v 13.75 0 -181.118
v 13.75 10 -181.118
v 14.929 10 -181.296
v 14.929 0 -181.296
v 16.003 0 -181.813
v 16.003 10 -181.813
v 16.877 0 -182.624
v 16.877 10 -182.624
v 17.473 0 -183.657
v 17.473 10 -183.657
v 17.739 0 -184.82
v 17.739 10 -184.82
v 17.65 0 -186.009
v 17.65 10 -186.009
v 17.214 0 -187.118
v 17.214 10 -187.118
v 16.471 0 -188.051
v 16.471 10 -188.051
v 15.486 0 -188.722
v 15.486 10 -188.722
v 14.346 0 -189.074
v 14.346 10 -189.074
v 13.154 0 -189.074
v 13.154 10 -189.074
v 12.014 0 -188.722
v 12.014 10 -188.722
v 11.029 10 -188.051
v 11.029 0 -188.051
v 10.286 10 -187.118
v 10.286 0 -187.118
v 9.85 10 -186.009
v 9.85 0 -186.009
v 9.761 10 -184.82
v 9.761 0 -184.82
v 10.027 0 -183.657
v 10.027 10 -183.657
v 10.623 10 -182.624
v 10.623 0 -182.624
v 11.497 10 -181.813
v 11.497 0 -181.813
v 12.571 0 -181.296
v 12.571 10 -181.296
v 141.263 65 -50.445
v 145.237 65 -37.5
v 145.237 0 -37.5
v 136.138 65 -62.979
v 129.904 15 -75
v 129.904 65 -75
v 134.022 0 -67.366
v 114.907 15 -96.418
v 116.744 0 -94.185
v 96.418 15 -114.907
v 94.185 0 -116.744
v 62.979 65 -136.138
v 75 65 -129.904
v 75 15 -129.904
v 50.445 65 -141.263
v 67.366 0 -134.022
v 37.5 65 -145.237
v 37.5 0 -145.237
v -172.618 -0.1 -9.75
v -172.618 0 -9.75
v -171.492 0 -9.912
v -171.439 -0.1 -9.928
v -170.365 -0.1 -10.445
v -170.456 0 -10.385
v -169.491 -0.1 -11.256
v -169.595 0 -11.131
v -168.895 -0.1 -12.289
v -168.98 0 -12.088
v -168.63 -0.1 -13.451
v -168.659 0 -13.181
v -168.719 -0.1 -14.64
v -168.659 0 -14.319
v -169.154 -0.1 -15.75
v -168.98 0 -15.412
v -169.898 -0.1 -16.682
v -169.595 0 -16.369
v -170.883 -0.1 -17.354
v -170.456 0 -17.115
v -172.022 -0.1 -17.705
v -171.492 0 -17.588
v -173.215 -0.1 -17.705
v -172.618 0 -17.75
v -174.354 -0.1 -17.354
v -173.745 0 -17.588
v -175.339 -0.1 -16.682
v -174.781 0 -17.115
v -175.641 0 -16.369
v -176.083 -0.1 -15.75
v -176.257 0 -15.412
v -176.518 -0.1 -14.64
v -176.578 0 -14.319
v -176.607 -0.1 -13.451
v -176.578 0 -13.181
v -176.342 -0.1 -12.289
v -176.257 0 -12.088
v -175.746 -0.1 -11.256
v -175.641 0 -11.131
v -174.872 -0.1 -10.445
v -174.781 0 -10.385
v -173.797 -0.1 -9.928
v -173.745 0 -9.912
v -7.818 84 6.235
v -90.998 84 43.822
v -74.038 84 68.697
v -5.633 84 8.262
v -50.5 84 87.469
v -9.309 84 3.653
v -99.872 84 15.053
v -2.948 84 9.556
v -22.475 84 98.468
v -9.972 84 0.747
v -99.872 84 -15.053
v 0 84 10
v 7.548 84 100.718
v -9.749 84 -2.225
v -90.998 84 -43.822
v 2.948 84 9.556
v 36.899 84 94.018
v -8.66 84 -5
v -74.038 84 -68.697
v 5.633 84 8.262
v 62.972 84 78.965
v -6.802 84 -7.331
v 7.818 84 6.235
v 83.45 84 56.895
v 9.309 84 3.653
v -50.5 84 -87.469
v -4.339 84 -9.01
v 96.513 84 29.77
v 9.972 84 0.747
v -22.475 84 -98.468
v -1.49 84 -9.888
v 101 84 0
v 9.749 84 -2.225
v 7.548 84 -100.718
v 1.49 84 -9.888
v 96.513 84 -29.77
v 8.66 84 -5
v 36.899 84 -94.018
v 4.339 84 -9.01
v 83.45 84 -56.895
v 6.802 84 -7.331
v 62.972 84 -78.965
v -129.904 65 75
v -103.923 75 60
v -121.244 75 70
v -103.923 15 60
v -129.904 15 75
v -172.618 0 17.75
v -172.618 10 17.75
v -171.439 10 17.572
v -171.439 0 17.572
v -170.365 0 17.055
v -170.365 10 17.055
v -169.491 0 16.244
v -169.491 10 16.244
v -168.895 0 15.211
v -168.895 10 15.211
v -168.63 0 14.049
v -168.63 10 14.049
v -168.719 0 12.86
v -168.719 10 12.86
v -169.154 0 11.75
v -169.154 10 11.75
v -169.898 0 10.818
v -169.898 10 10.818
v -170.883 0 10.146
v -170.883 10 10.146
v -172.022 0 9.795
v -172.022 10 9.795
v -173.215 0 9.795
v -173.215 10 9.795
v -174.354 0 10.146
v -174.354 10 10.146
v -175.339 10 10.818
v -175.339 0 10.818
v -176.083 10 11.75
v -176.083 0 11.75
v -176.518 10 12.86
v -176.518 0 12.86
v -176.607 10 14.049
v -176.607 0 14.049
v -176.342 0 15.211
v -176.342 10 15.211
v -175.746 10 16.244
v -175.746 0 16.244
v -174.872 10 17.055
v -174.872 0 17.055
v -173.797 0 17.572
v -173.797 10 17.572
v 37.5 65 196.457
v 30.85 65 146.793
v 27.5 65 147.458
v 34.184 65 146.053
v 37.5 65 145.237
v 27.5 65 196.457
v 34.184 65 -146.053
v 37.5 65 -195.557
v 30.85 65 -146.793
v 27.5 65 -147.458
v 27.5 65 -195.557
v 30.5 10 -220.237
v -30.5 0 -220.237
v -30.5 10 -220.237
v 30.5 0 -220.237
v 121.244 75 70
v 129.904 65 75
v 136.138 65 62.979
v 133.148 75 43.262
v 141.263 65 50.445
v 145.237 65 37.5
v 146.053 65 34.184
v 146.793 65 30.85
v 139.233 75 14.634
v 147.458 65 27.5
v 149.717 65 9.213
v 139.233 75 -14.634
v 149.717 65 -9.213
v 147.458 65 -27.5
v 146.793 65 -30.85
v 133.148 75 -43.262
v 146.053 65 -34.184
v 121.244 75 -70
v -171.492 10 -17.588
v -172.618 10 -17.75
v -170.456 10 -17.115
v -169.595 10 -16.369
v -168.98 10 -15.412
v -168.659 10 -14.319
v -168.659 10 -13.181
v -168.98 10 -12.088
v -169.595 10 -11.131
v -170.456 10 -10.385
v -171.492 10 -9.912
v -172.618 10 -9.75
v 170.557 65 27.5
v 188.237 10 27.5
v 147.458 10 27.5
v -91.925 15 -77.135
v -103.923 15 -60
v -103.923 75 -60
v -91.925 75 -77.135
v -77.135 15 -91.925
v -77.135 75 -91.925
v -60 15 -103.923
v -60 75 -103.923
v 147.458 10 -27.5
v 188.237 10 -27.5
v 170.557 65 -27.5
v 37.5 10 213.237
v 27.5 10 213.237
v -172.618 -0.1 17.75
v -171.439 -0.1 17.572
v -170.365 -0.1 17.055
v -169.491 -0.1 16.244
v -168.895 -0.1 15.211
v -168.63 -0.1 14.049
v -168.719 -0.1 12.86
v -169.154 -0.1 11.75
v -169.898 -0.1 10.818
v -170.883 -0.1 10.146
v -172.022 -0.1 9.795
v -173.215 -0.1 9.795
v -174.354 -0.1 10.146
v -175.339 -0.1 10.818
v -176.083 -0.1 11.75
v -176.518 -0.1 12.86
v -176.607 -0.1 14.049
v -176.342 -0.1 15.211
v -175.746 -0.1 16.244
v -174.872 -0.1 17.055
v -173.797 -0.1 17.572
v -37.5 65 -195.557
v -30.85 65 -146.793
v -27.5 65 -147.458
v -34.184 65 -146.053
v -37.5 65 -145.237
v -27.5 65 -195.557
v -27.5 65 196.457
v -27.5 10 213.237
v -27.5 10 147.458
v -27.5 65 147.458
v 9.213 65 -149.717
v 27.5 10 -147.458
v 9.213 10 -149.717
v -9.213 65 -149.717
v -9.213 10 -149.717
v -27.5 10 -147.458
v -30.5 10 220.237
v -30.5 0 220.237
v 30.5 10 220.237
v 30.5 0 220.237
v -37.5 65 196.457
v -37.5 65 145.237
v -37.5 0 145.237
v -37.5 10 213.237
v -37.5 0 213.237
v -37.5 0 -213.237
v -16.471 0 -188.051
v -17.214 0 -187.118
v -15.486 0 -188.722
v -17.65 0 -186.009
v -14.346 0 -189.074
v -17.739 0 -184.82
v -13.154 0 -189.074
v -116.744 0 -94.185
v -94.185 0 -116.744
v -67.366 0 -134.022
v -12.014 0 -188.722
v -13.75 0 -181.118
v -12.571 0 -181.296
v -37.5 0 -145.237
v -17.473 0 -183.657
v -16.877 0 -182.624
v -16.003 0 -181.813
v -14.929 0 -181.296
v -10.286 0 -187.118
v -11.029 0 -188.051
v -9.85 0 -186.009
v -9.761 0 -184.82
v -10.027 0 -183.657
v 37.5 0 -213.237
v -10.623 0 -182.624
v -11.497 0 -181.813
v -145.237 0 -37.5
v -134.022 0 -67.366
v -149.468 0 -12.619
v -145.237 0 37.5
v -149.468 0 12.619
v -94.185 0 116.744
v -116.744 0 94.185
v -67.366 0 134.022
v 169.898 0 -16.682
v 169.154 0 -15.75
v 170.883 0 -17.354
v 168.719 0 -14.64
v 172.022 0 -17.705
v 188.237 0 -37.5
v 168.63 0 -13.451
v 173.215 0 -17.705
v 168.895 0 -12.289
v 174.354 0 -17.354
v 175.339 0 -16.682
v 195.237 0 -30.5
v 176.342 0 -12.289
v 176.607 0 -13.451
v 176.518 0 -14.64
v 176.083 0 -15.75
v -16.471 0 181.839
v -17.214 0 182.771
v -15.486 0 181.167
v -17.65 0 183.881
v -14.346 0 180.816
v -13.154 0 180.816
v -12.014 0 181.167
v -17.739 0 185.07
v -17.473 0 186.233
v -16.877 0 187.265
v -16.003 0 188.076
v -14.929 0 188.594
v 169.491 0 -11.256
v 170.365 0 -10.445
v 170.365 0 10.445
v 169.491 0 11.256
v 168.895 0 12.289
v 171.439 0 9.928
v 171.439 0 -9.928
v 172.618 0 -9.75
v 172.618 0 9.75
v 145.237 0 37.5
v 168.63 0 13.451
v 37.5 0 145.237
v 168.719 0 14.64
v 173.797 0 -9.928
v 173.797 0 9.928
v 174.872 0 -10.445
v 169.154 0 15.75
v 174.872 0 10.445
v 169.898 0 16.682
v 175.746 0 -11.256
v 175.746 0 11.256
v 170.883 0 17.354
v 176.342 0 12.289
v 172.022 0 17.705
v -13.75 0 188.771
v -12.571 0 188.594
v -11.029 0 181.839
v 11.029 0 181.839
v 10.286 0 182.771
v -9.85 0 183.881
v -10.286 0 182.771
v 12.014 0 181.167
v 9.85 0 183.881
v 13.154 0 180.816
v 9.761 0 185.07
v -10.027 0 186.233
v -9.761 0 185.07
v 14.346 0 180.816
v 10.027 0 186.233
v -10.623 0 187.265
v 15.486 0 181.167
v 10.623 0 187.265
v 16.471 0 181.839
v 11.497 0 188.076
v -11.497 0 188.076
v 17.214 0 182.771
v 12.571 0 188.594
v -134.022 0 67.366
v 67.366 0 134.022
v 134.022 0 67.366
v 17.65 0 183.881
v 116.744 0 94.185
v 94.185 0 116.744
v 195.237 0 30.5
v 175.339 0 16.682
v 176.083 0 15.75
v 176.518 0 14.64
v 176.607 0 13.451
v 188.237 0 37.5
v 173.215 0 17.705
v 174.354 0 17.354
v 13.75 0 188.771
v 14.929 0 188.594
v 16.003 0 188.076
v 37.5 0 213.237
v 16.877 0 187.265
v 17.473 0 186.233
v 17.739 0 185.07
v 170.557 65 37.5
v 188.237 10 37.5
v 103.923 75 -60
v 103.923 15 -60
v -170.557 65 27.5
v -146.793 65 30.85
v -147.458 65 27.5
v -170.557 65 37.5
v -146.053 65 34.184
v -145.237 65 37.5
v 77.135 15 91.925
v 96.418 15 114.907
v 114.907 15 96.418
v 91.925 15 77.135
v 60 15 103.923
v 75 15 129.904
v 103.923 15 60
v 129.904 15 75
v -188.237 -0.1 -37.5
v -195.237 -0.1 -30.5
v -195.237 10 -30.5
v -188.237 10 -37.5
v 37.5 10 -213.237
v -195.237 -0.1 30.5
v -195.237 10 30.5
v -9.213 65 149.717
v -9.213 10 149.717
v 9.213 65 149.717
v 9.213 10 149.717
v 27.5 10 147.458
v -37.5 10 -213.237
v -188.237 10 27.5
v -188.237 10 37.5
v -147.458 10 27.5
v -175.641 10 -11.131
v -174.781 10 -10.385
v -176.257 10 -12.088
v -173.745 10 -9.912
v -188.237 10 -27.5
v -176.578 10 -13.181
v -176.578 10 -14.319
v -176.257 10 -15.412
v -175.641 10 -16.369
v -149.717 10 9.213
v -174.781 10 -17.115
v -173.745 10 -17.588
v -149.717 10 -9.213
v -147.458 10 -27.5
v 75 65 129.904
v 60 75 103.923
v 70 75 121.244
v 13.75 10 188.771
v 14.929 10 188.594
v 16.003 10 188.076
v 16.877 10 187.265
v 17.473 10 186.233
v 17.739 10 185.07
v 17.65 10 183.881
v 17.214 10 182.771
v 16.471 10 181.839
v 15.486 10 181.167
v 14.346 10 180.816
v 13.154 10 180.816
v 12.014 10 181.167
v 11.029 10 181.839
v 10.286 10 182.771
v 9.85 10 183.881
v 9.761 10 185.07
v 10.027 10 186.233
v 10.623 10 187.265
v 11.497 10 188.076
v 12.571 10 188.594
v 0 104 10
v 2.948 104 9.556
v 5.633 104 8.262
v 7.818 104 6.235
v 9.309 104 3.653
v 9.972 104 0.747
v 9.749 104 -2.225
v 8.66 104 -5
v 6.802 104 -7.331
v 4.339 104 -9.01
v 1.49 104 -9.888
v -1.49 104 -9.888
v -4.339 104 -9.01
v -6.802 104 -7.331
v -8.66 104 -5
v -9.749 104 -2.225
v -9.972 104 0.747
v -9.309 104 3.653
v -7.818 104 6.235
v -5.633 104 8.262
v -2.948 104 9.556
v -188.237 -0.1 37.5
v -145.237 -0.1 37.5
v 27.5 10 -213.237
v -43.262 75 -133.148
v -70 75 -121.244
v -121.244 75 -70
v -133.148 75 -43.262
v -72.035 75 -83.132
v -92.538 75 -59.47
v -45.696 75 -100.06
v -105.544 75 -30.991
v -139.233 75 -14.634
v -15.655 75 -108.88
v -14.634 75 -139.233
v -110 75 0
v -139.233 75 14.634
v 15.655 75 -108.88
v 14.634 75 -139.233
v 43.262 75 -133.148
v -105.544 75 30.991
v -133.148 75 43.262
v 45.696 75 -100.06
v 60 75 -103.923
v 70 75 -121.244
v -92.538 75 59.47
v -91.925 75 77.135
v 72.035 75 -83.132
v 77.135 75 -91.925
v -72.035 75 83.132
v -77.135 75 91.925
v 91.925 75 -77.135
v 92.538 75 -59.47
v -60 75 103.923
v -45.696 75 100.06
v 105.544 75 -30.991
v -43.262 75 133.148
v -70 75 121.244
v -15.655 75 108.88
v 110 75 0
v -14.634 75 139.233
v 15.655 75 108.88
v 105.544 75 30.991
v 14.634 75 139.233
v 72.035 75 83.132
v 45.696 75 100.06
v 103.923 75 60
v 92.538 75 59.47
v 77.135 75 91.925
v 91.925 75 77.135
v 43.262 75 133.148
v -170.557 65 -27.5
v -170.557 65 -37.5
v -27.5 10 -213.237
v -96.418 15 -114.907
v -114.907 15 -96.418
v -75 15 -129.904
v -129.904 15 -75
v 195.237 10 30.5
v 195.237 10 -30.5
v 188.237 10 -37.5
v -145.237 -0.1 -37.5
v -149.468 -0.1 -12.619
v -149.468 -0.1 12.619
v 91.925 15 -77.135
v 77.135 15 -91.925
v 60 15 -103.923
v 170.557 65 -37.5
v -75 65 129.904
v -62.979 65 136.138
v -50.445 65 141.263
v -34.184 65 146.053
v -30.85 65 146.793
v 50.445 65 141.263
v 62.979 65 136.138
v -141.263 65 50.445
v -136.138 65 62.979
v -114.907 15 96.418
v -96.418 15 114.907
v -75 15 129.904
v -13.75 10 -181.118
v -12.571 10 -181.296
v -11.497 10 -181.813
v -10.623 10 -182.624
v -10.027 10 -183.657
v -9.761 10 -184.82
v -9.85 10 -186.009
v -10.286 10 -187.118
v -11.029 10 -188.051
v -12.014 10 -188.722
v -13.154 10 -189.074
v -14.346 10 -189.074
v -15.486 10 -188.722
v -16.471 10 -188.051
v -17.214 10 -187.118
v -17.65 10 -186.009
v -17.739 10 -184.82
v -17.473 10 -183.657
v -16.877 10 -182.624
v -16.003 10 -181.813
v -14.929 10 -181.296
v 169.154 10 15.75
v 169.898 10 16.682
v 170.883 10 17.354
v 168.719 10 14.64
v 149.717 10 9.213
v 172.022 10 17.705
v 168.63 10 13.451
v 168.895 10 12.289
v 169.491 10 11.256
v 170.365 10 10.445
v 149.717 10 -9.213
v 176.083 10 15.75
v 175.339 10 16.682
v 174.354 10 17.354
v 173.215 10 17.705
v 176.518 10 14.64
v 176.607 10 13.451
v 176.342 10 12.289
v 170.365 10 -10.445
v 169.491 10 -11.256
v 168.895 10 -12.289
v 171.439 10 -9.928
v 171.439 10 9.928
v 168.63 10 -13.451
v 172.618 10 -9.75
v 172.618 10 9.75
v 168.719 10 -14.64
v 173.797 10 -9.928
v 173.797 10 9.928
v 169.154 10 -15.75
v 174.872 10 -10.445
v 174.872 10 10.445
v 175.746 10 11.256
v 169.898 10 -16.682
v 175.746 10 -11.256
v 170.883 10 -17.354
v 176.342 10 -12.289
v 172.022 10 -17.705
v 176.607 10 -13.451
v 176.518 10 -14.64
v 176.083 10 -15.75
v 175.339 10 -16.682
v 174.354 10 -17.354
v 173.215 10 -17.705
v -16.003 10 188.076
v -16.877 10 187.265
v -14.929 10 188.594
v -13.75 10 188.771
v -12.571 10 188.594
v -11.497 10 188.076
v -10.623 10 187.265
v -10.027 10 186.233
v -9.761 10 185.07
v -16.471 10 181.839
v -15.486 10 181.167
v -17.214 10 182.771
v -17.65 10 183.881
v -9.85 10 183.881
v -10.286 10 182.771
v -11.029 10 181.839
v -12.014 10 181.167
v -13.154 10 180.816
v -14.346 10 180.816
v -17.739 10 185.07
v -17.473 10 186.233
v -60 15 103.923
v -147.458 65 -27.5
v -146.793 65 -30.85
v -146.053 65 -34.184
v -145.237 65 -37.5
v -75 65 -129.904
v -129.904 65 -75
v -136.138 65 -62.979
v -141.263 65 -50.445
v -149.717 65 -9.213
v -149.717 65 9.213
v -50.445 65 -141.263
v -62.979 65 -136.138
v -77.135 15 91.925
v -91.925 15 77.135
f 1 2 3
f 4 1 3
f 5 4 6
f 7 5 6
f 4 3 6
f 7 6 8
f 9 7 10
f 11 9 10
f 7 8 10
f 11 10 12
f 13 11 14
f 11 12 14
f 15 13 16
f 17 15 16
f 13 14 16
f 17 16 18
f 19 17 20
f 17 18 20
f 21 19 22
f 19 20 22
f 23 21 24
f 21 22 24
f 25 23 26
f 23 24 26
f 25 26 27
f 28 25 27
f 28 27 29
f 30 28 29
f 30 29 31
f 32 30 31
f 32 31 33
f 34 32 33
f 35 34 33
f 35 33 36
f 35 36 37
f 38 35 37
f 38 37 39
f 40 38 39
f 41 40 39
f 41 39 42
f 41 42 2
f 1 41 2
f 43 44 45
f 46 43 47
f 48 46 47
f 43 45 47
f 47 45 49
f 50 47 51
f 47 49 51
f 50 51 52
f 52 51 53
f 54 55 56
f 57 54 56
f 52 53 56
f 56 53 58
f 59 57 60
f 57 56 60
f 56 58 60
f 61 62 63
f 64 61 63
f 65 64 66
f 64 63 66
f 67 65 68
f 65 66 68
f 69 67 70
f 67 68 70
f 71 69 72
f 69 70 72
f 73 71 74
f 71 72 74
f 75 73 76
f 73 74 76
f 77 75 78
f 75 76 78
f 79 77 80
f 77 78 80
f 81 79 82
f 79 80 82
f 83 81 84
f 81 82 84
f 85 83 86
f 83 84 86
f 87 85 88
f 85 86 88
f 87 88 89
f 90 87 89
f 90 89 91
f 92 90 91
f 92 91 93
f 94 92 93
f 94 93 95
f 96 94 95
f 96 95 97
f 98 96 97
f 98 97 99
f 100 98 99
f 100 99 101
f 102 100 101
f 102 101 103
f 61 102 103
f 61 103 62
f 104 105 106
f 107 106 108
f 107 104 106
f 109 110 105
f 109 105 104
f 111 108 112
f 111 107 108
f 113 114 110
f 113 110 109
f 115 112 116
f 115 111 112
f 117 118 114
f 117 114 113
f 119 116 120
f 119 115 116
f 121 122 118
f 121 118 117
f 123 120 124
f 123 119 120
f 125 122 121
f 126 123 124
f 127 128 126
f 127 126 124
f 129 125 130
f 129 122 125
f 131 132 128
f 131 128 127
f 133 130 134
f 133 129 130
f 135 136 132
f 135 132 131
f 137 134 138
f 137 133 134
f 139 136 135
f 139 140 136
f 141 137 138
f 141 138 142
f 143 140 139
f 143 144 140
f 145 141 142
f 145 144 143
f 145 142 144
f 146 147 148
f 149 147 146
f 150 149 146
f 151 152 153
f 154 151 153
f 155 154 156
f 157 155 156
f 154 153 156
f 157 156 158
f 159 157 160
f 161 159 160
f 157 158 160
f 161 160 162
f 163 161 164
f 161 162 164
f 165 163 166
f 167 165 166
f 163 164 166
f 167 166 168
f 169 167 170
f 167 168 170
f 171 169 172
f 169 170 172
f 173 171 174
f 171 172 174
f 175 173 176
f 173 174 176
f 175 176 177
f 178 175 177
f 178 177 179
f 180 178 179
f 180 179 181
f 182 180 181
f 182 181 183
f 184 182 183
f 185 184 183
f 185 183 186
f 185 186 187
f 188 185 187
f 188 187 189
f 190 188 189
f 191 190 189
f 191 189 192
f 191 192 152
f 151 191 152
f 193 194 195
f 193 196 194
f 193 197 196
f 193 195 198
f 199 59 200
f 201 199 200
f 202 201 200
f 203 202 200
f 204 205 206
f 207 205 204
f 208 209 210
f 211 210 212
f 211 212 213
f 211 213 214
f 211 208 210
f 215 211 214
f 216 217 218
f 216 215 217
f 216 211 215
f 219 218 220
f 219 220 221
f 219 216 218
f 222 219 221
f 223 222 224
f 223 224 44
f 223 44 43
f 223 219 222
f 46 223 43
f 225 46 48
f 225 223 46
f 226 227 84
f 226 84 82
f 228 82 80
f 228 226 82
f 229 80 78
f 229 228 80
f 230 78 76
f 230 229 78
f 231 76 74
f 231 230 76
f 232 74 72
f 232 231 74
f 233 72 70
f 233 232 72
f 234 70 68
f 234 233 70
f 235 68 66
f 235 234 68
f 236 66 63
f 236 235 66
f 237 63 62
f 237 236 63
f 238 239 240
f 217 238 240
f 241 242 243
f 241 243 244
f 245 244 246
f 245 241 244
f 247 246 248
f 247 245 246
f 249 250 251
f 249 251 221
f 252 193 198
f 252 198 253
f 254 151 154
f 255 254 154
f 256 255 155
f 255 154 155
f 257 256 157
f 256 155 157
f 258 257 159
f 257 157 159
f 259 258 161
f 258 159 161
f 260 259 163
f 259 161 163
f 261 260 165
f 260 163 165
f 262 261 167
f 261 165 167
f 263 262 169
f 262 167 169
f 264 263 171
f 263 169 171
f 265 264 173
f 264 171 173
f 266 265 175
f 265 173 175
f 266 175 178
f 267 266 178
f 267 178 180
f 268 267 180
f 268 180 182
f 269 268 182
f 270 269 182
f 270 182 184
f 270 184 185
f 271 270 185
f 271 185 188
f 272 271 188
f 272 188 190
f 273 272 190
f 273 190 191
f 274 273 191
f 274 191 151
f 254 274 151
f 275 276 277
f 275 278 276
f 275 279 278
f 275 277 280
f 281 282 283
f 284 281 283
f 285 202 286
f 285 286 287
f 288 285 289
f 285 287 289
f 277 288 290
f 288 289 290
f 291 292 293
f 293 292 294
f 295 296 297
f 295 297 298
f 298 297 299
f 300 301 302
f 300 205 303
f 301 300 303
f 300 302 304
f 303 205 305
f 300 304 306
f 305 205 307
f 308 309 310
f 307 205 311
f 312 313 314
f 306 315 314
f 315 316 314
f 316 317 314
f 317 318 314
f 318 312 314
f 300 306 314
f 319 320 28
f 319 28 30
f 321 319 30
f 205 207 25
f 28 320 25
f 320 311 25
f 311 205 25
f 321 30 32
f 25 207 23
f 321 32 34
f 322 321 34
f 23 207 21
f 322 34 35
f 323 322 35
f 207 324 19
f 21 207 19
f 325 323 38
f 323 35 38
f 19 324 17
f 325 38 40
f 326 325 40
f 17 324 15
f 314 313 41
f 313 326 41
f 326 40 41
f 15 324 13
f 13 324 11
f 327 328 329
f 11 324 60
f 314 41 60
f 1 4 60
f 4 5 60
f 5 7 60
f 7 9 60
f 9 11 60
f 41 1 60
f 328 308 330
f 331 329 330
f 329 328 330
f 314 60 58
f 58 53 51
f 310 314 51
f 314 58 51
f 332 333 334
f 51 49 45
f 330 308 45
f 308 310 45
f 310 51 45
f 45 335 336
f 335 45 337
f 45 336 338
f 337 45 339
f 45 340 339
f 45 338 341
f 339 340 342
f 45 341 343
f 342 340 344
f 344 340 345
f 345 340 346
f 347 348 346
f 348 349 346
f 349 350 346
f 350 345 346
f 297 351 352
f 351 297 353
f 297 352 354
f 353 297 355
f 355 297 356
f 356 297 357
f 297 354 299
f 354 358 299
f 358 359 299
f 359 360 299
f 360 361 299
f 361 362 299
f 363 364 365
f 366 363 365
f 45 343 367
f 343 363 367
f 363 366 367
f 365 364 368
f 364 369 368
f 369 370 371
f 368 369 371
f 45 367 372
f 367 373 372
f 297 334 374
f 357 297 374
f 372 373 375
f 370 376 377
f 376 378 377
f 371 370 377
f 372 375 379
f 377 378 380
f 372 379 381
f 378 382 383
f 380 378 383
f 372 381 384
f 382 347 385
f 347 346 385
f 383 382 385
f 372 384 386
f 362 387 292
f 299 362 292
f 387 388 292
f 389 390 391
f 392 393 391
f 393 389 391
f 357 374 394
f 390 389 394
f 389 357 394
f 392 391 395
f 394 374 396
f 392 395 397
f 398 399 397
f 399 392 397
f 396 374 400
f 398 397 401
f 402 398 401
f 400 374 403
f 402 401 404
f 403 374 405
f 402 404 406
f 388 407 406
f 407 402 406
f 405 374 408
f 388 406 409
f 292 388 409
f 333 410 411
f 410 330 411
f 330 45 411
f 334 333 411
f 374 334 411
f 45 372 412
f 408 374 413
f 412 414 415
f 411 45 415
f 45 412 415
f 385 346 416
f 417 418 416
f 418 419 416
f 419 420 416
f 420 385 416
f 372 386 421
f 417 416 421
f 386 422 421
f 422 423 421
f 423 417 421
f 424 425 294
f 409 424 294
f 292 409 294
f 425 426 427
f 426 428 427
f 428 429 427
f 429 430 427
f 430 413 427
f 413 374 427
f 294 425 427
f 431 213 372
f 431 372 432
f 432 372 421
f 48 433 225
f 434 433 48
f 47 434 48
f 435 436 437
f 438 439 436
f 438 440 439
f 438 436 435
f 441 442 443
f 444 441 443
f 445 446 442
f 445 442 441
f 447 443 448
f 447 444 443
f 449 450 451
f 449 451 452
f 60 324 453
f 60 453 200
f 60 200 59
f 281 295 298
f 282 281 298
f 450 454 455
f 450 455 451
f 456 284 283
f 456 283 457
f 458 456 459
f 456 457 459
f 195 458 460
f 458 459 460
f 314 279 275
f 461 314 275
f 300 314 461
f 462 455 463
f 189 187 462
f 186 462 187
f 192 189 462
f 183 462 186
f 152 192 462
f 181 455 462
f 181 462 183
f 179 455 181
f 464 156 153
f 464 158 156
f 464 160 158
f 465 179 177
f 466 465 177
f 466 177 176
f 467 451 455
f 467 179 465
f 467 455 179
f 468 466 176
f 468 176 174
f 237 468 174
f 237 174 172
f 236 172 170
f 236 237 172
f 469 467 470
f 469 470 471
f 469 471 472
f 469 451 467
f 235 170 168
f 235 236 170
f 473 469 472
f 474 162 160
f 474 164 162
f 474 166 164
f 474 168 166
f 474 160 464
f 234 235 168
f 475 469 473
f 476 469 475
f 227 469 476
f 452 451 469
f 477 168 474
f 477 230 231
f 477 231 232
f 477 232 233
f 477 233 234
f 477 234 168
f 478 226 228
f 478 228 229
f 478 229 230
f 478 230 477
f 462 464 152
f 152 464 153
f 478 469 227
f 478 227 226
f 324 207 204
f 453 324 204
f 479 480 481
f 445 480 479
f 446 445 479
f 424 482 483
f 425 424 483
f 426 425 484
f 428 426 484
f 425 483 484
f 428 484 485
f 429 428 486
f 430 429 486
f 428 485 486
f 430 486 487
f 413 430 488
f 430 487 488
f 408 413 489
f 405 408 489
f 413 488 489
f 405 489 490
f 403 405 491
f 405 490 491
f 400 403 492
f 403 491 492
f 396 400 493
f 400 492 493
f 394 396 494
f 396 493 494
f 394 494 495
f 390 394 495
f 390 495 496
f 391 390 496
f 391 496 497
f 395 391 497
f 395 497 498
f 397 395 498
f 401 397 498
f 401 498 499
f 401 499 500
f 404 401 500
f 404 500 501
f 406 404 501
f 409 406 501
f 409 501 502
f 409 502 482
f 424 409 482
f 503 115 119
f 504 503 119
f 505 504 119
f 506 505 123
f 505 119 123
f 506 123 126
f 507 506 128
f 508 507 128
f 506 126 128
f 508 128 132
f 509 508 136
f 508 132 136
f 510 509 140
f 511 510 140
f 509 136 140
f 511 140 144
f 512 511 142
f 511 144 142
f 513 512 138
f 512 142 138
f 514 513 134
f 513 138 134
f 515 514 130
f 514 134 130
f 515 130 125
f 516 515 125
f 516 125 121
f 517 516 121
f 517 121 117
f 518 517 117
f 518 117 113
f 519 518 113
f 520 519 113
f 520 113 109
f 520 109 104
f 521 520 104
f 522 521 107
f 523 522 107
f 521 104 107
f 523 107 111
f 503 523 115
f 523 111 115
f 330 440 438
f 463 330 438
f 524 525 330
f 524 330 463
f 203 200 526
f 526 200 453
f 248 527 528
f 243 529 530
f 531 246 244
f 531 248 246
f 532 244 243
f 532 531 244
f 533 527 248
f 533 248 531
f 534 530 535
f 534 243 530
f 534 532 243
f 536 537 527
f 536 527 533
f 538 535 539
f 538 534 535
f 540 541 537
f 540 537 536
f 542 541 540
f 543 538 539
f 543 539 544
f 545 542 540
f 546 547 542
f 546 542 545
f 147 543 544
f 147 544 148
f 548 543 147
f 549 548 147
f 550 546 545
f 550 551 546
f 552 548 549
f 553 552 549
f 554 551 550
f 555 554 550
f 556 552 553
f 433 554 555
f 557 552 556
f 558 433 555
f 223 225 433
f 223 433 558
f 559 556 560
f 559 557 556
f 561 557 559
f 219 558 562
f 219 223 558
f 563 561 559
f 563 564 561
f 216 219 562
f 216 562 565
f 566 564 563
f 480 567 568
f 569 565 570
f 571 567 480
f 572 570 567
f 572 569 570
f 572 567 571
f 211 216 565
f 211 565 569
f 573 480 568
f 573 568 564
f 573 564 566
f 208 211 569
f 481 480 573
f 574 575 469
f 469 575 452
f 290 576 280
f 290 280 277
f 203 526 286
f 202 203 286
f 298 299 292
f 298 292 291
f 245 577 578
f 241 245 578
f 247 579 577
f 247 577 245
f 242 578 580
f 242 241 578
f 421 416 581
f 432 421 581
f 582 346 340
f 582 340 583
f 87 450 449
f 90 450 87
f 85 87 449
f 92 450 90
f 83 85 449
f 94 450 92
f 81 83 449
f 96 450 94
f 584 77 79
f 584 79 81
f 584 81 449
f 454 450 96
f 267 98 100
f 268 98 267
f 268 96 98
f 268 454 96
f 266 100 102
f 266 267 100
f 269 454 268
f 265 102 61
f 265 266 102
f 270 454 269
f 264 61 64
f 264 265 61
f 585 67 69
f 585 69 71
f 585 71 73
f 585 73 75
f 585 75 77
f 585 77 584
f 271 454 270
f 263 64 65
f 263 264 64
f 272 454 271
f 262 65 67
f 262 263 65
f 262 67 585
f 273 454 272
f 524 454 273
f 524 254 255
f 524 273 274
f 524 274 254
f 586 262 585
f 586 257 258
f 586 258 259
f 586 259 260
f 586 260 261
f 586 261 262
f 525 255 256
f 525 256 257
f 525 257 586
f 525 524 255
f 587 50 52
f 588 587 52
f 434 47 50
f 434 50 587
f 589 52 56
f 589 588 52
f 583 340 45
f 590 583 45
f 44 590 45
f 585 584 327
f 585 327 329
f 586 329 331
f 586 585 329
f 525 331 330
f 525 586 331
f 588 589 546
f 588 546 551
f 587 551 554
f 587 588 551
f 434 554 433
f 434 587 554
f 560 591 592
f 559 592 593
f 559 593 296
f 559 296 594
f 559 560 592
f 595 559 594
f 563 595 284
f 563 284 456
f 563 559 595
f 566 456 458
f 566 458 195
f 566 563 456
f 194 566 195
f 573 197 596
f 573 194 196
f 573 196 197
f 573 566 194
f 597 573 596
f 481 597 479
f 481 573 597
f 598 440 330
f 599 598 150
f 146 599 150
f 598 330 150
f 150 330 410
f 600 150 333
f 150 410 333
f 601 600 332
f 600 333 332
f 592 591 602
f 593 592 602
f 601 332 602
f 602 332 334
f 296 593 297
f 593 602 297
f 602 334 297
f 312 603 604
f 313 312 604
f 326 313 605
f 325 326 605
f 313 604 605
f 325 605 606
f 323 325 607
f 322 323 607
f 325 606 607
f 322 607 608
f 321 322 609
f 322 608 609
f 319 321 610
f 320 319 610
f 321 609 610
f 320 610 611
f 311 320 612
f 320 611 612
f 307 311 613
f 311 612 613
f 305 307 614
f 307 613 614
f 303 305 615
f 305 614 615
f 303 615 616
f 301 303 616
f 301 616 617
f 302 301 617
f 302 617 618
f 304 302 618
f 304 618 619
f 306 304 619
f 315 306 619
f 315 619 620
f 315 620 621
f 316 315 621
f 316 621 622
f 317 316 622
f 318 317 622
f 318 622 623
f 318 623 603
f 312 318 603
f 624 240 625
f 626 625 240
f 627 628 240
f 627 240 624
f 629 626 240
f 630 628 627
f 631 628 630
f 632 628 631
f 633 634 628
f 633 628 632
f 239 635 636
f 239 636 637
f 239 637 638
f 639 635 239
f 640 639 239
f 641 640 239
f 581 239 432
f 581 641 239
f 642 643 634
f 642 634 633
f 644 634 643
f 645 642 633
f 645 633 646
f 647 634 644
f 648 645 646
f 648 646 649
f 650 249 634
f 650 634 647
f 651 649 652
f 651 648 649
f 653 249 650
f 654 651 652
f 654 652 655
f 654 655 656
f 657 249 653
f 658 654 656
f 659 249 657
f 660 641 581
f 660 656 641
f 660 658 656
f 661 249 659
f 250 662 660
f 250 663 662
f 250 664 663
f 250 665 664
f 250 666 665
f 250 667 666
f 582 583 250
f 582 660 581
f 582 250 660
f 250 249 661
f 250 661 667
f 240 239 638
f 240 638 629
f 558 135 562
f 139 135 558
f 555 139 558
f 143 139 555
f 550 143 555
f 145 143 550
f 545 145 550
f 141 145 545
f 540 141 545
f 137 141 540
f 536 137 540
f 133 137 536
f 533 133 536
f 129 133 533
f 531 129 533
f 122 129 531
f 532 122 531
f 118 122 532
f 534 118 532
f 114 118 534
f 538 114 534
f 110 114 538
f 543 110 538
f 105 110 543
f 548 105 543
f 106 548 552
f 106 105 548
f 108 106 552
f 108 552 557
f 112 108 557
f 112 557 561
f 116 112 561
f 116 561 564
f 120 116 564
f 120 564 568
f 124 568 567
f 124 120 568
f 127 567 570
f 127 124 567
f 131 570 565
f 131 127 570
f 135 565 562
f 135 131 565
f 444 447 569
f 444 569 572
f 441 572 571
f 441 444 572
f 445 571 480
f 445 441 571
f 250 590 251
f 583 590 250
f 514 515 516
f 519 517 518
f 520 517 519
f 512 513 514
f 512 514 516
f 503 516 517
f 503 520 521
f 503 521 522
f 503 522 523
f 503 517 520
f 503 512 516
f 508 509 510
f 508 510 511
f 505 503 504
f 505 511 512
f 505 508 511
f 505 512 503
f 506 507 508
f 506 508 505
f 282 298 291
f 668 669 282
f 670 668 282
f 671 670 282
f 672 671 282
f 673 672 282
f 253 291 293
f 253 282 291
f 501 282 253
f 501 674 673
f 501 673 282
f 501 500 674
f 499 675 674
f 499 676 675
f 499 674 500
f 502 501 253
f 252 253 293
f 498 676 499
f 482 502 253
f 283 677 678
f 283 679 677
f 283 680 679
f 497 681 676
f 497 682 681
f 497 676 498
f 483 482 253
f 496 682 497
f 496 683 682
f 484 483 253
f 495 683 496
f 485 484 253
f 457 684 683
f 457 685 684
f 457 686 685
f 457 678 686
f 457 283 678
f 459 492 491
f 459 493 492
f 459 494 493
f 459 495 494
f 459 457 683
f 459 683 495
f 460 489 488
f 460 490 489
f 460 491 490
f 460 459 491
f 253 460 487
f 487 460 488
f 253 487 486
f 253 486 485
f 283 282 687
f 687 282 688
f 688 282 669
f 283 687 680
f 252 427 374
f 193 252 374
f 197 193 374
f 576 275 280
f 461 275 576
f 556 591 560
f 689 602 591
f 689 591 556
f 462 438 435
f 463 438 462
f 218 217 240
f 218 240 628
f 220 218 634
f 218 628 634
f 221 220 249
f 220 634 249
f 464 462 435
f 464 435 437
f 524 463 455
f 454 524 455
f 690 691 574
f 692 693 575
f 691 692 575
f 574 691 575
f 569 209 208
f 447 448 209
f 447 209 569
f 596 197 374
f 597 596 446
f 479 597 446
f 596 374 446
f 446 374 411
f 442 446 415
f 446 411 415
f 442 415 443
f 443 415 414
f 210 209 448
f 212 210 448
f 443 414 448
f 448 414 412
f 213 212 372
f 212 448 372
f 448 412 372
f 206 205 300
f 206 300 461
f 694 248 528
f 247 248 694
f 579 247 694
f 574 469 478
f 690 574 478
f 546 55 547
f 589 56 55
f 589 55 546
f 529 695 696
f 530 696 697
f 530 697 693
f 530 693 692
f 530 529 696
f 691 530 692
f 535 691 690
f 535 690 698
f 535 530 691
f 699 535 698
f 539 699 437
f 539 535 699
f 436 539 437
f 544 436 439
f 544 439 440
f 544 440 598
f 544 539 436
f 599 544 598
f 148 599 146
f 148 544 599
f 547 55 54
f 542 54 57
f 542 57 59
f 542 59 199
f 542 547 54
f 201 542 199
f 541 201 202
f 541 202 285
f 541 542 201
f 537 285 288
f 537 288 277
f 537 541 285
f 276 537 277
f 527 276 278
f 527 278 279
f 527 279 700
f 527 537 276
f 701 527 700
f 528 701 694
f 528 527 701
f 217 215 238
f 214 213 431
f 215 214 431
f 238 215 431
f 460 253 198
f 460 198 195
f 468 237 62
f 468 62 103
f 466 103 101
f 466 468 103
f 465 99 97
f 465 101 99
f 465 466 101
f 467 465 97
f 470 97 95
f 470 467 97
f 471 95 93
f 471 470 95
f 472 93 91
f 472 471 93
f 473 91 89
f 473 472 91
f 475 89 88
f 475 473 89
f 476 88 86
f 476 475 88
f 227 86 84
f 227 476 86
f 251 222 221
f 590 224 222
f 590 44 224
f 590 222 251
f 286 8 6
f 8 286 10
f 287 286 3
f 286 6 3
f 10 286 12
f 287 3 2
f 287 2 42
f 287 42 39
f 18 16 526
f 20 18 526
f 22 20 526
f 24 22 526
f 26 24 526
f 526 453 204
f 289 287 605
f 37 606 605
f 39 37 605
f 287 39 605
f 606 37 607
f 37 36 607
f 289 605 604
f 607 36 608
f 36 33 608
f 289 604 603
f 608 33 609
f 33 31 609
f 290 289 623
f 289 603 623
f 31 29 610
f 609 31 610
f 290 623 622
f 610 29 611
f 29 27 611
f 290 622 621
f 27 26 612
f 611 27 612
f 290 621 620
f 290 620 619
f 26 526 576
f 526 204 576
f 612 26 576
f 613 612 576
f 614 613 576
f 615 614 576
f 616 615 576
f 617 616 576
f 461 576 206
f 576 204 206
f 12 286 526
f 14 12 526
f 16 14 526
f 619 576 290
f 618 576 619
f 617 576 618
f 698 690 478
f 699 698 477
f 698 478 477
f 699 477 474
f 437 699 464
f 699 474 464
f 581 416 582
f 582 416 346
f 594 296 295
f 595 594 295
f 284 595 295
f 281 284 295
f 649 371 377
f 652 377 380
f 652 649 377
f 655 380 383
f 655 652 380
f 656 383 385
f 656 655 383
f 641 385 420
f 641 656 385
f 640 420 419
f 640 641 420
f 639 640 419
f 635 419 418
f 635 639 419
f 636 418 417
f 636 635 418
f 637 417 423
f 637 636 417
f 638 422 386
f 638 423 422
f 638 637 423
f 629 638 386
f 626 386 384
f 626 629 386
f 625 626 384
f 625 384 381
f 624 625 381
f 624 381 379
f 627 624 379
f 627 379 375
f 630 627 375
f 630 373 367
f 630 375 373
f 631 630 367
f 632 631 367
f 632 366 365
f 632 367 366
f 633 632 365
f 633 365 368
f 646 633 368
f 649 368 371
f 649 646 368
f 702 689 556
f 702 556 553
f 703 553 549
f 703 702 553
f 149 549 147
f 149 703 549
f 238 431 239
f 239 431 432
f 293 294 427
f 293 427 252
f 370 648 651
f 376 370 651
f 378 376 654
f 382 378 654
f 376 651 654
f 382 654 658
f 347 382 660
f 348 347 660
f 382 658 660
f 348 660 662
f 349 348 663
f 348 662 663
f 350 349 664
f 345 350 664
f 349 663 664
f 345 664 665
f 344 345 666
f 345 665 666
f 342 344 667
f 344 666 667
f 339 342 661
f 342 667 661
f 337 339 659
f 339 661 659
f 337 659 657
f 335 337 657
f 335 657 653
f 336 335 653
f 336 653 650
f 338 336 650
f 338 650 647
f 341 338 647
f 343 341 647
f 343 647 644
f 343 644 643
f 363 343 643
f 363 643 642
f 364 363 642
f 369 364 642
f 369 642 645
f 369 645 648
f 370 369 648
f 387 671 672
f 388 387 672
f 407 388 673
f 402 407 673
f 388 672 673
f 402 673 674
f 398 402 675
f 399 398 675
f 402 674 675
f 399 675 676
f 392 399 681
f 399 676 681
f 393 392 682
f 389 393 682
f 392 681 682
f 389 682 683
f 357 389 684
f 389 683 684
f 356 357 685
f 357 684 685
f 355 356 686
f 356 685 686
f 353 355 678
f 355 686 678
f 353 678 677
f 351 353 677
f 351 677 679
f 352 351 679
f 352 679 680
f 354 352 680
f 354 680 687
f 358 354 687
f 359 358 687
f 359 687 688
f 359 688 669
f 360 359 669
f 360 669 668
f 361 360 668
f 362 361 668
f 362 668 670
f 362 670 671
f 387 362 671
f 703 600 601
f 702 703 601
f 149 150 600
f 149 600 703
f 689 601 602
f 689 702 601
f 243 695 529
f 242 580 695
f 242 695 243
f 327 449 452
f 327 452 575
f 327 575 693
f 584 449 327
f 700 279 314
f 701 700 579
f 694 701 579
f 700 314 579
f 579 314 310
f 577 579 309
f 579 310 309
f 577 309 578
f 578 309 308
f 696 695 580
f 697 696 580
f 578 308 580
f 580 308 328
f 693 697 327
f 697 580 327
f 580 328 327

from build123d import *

# Parameters (mm, degrees)
SKETCH1_R            = 150
BOSS_EXTRUDE1_DEPTH  = 75
CHAMFER1_SIZE        = 10
BOSS_EXTRUDE2_START  = -75
BOSS_EXTRUDE2_DEPTH  = 10
CHAMFER2_SIZE        = 7
BOSS_EXTRUDE3_DEPTH  = 10
SKETCH7_R            = 4
CUT_EXTRUDE1_DEPTH   = 255.641782801
BOSS_EXTRUDE4_START  = 0.1
BOSS_EXTRUDE4_DEPTH  = 0.1
BOSS_EXTRUDE8_START  = -75
BOSS_EXTRUDE8_DEPTH  = 10
CHAMFER3_SIZE        = 7
BOSS_EXTRUDE9_DEPTH  = 10
SKETCH16_R           = 4
CUT_EXTRUDE2_DEPTH   = 302.407894506
CHAMFER4_SIZE        = 7
BOSS_EXTRUDE10_DEPTH = 10
SKETCH19_R           = 4
CUT_EXTRUDE3_DEPTH   = 302.407894506
BOSS_EXTRUDE11_START = -75
BOSS_EXTRUDE11_DEPTH = 10
CHAMFER5_SIZE        = 7
BOSS_EXTRUDE12_DEPTH = 10
SKETCH22_R           = 4
CUT_EXTRUDE4_DEPTH   = 302.407894506
CUT_EXTRUDE5_START   = -60
CUT_EXTRUDE5_DEPTH   = 60
CIRPATTERN31_COUNT   = 4
SKETCH24_R           = 110
BOSS_EXTRUDE13_DEPTH = 9
BOSS_EXTRUDE13_TAPER = 45
SKETCH25_R           = 10
BOSS_EXTRUDE14_DEPTH = 20
SKETCH28_R           = 4
CUT_EXTRUDE6_DEPTH   = 309.962325973


with BuildPart() as part:
    # Sketch1 → Boss-Extrude1 (new body)
    with BuildSketch(Plane(origin=(0, 0, 0), x_dir=(1, 0, 0), z_dir=(0, 1, 0))):
        with Locations(Location((0, 0, 0), (0, 0, 270))):
            Circle(SKETCH1_R)
    extrude(amount=BOSS_EXTRUDE1_DEPTH)

    # Chamfer1
    chamfer1_edges = [part.edges().sort_by_distance(p)[0] for p in [
        (0, 75, -150),
    ]]
    chamfer(chamfer1_edges, length=CHAMFER1_SIZE)

    # Sketch2 → Boss-Extrude2 (add)
    with BuildSketch(Plane(origin=(0, 75, 0), x_dir=(1, 0, 0), z_dir=(0, 1, 0)).offset(BOSS_EXTRUDE2_START)):
        with BuildLine():
            Line((-145.236875483, 37.5), (-195.236875483, 37.5))
            Line((-195.236875483, 37.5), (-195.236875483, -37.5))
            Line((-195.236875483, -37.5), (-145.236875483, -37.5))
            ThreePointArc((-145.236875483, -37.5), (-150, 0), (-145.236875483, 37.5))
        make_face()
    extrude(amount=BOSS_EXTRUDE2_DEPTH)

    # Chamfer2
    chamfer2_edges = [part.edges().sort_by_distance(p)[0] for p in [
        (-195.236875483, 5, 37.5),
        (-195.236875483, 5, -37.5),
    ]]
    chamfer(chamfer2_edges, length=CHAMFER2_SIZE)

    # Sketch6 → Boss-Extrude3 (add)
    with BuildSketch(Plane.XY.offset(37.5)):
        Polygon((-145.236875483, 0), (-145.236875483, 65), (-170.556875483, 65), (-188.236875483, 10), (-188.236875483, 0), align=None)
    boss_extrude3 = extrude(amount=-BOSS_EXTRUDE3_DEPTH)

    # Sketch7 → Cut-Extrude1 (cut, through all)
    with BuildSketch(Plane(origin=(0, 10, 0), x_dir=(1, 0, 0), z_dir=(0, 1, 0))):
        with Locations(Location((-172.618437741, -13.75, 0), (0, 0, 270))):
            Circle(SKETCH7_R)
    cut_extrude1 = extrude(amount=-CUT_EXTRUDE1_DEPTH, mode=Mode.SUBTRACT)

    # Mirror2: Boss-Extrude3, Cut-Extrude1 across plane
    add(boss_extrude3.mirror(Plane.XY))
    add(cut_extrude1.mirror(Plane.XY), mode=Mode.SUBTRACT)

    # Sketch10 → Boss-Extrude4 (add)
    with BuildSketch(Plane.XZ.offset(BOSS_EXTRUDE4_START)):
        with BuildLine():
            Line((-145.236875483, 37.5), (-188.236875483, 37.5))
            Line((-188.236875483, 37.5), (-195.236875483, 30.5))
            Line((-195.236875483, 30.5), (-195.236875483, -30.5))
            Line((-195.236875483, -30.5), (-188.236875483, -37.5))
            Line((-188.236875483, -37.5), (-145.236875483, -37.5))
            ThreePointArc((-145.236875483, -37.5), (-150, 0), (-145.236875483, 37.5))
        make_face()
    extrude(amount=-BOSS_EXTRUDE4_DEPTH)

    # Sketch11 → Boss-Extrude8 (add)
    with BuildSketch(Plane(origin=(0, 75, 0), x_dir=(1, 0, 0), z_dir=(0, 1, 0)).offset(BOSS_EXTRUDE8_START)):
        with BuildLine():
            Line((37.5, 220.236875483), (37.5, 145.236875483))
            ThreePointArc((37.5, 145.236875483), (0, 150), (-37.5, 145.236875483))
            Line((-37.5, 145.236875483), (-37.5, 220.236875483))
            Line((-37.5, 220.236875483), (37.5, 220.236875483))
        make_face()
        with BuildLine():
            Line((37.5, -220.236875483), (37.5, -145.236875483))
            ThreePointArc((37.5, -145.236875483), (0, -150), (-37.5, -145.236875483))
            Line((-37.5, -145.236875483), (-37.5, -220.236875483))
            Line((-37.5, -220.236875483), (37.5, -220.236875483))
        make_face()
    extrude(amount=BOSS_EXTRUDE8_DEPTH)

    # Chamfer3
    chamfer3_edges = [part.edges().sort_by_distance(p)[0] for p in [
        (37.5, 5, -220.236875483),
        (-37.5, 5, -220.236875483),
    ]]
    chamfer(chamfer3_edges, length=CHAMFER3_SIZE)

    # Sketch14 → Boss-Extrude9 (add)
    with BuildSketch(Plane.ZY.offset(37.5)):
        Polygon((-145.236875483, 0), (-145.236875483, 65), (-195.556875483, 65), (-213.236875483, 10), (-213.236875483, 0), align=None)
    boss_extrude9 = extrude(amount=-BOSS_EXTRUDE9_DEPTH)

    # Mirror3: Boss-Extrude9 across plane
    add(boss_extrude9.mirror(Plane.ZY))

    # Sketch16 → Cut-Extrude2 (cut, through all)
    with BuildSketch(Plane(origin=(0, 10, 0), x_dir=(1, 0, 0), z_dir=(0, 1, 0))):
        with Locations(Location((-13.75, 185.118437741, 0), (0, 0, 270))):
            Circle(SKETCH16_R)
        with Locations(Location((13.75, 185.118437741, 0), (0, 0, 270))):
            Circle(SKETCH16_R)
    extrude(amount=-CUT_EXTRUDE2_DEPTH, mode=Mode.SUBTRACT)

    # Chamfer4
    chamfer4_edges = [part.edges().sort_by_distance(p)[0] for p in [
        (-37.5, 5, 220.236875483),
        (37.5, 5, 220.236875483),
    ]]
    chamfer(chamfer4_edges, length=CHAMFER4_SIZE)

    # Sketch18 → Boss-Extrude10 (add)
    with BuildSketch(Plane(origin=(37.5, 0, 0), x_dir=(0, 0, -1), z_dir=(1, 0, 0))):
        Polygon((-145.236875483, 0), (-145.236875483, 65), (-196.456875483, 65), (-213.236875483, 10), (-213.236875483, 0), align=None)
    boss_extrude10 = extrude(amount=-BOSS_EXTRUDE10_DEPTH)

    # Sketch19 → Cut-Extrude3 (cut, through all)
    with BuildSketch(Plane(origin=(0, 10, 0), x_dir=(1, 0, 0), z_dir=(0, 1, 0))):
        with Locations(Location((13.75, -184.771281751, 0), (0, 0, 270))):
            Circle(SKETCH19_R)
        with Locations(Location((-13.75, -184.771281751, 0), (0, 0, 270))):
            Circle(SKETCH19_R)
    extrude(amount=-CUT_EXTRUDE3_DEPTH, mode=Mode.SUBTRACT)

    # Mirror4: Boss-Extrude10 across plane
    add(boss_extrude10.mirror(Plane(origin=(0, 0, 0), x_dir=(0, 0, 1), z_dir=(1, 0, 0))))

    # Sketch20 → Boss-Extrude11 (add)
    with BuildSketch(Plane(origin=(0, 75, 0), x_dir=(1, 0, 0), z_dir=(0, 1, 0)).offset(BOSS_EXTRUDE11_START)):
        with BuildLine():
            Line((195.236875483, 37.5), (145.236875483, 37.5))
            ThreePointArc((145.236875483, 37.5), (150, 0), (145.236875483, -37.5))
            Line((145.236875483, -37.5), (195.236875483, -37.5))
            Line((195.236875483, -37.5), (195.236875483, 37.5))
        make_face()
    extrude(amount=BOSS_EXTRUDE11_DEPTH)

    # Chamfer5
    chamfer5_edges = [part.edges().sort_by_distance(p)[0] for p in [
        (195.236875483, 5, 37.5),
        (195.236875483, 5, -37.5),
    ]]
    chamfer(chamfer5_edges, length=CHAMFER5_SIZE)

    # Sketch21 → Boss-Extrude12 (add)
    with BuildSketch(Plane(origin=(0, 0, -37.5), x_dir=(-1, 0, 0), z_dir=(0, 0, -1))):
        Polygon((-145.236875483, 0), (-145.236875483, 65), (-170.556875483, 65), (-188.236875483, 10), (-188.236875483, 0), align=None)
    boss_extrude12 = extrude(amount=-BOSS_EXTRUDE12_DEPTH)

    # Sketch22 → Cut-Extrude4 (cut, through all)
    with BuildSketch(Plane(origin=(0, 10, 0), x_dir=(1, 0, 0), z_dir=(0, 1, 0))):
        with Locations(Location((172.618437741, 13.75, 0), (0, 0, 270))):
            Circle(SKETCH22_R)
    cut_extrude4 = extrude(amount=-CUT_EXTRUDE4_DEPTH, mode=Mode.SUBTRACT)

    # Mirror5: Boss-Extrude12, Cut-Extrude4 across plane
    add(boss_extrude12.mirror(Plane(origin=(0, 0, 0), x_dir=(1, 0, 0), z_dir=(0, 0, -1))))
    add(cut_extrude4.mirror(Plane(origin=(0, 0, 0), x_dir=(1, 0, 0), z_dir=(0, 0, -1))), mode=Mode.SUBTRACT)

    # Sketch23 → Cut-Extrude5 (cut)
    with BuildSketch(Plane(origin=(0, 75, 0), x_dir=(1, 0, 0), z_dir=(0, 1, 0)).offset(CUT_EXTRUDE5_START)):
        with BuildLine():
            Line((-103.923048454, -60), (-129.903810568, -75))
            ThreePointArc((-129.903810568, -75), (-106.066017178, -106.066017178), (-75, -129.903810568))
            Line((-75, -129.903810568), (-60, -103.923048454))
            ThreePointArc((-60, -103.923048454), (-84.852813742, -84.852813742), (-103.923048454, -60))
        make_face()
    cut_extrude5 = extrude(amount=CUT_EXTRUDE5_DEPTH, mode=Mode.SUBTRACT)

    # CirPattern31: Cut-Extrude5 ×4 about axis
    cirpattern31_axis = Axis((0, 75, 0), (0, 1, 0))
    for i in range(1, CIRPATTERN31_COUNT):
        add(cut_extrude5.rotate(cirpattern31_axis, i * 360 / CIRPATTERN31_COUNT), mode=Mode.SUBTRACT)

    # Sketch24 → Boss-Extrude13 (add)
    with BuildSketch(Plane(origin=(0, 75, 0), x_dir=(1, 0, 0), z_dir=(0, 1, 0))):
        Circle(SKETCH24_R)
    extrude(amount=BOSS_EXTRUDE13_DEPTH, taper=BOSS_EXTRUDE13_TAPER)

    # Sketch25 → Boss-Extrude14 (add)
    with BuildSketch(Plane(origin=(0, 84, 0), x_dir=(1, 0, 0), z_dir=(0, 1, 0))):
        with Locations(Location((0, 0, 0), (0, 0, 270))):
            Circle(SKETCH25_R)
    extrude(amount=BOSS_EXTRUDE14_DEPTH)

    # Sketch28 → Cut-Extrude6 (cut, through all)
    with BuildSketch(Plane(origin=(0, 10, 0), x_dir=(1, 0, 0), z_dir=(0, 1, 0))):
        with Locations(Location((-172.618437741, 13.75, 0), (0, 0, 270))):
            Circle(SKETCH28_R)
        with Locations(Location((-172.618437741, -13.75, 0), (0, 0, 270))):
            Circle(SKETCH28_R)
    extrude(amount=-CUT_EXTRUDE6_DEPTH, mode=Mode.SUBTRACT)


solid = part.part
